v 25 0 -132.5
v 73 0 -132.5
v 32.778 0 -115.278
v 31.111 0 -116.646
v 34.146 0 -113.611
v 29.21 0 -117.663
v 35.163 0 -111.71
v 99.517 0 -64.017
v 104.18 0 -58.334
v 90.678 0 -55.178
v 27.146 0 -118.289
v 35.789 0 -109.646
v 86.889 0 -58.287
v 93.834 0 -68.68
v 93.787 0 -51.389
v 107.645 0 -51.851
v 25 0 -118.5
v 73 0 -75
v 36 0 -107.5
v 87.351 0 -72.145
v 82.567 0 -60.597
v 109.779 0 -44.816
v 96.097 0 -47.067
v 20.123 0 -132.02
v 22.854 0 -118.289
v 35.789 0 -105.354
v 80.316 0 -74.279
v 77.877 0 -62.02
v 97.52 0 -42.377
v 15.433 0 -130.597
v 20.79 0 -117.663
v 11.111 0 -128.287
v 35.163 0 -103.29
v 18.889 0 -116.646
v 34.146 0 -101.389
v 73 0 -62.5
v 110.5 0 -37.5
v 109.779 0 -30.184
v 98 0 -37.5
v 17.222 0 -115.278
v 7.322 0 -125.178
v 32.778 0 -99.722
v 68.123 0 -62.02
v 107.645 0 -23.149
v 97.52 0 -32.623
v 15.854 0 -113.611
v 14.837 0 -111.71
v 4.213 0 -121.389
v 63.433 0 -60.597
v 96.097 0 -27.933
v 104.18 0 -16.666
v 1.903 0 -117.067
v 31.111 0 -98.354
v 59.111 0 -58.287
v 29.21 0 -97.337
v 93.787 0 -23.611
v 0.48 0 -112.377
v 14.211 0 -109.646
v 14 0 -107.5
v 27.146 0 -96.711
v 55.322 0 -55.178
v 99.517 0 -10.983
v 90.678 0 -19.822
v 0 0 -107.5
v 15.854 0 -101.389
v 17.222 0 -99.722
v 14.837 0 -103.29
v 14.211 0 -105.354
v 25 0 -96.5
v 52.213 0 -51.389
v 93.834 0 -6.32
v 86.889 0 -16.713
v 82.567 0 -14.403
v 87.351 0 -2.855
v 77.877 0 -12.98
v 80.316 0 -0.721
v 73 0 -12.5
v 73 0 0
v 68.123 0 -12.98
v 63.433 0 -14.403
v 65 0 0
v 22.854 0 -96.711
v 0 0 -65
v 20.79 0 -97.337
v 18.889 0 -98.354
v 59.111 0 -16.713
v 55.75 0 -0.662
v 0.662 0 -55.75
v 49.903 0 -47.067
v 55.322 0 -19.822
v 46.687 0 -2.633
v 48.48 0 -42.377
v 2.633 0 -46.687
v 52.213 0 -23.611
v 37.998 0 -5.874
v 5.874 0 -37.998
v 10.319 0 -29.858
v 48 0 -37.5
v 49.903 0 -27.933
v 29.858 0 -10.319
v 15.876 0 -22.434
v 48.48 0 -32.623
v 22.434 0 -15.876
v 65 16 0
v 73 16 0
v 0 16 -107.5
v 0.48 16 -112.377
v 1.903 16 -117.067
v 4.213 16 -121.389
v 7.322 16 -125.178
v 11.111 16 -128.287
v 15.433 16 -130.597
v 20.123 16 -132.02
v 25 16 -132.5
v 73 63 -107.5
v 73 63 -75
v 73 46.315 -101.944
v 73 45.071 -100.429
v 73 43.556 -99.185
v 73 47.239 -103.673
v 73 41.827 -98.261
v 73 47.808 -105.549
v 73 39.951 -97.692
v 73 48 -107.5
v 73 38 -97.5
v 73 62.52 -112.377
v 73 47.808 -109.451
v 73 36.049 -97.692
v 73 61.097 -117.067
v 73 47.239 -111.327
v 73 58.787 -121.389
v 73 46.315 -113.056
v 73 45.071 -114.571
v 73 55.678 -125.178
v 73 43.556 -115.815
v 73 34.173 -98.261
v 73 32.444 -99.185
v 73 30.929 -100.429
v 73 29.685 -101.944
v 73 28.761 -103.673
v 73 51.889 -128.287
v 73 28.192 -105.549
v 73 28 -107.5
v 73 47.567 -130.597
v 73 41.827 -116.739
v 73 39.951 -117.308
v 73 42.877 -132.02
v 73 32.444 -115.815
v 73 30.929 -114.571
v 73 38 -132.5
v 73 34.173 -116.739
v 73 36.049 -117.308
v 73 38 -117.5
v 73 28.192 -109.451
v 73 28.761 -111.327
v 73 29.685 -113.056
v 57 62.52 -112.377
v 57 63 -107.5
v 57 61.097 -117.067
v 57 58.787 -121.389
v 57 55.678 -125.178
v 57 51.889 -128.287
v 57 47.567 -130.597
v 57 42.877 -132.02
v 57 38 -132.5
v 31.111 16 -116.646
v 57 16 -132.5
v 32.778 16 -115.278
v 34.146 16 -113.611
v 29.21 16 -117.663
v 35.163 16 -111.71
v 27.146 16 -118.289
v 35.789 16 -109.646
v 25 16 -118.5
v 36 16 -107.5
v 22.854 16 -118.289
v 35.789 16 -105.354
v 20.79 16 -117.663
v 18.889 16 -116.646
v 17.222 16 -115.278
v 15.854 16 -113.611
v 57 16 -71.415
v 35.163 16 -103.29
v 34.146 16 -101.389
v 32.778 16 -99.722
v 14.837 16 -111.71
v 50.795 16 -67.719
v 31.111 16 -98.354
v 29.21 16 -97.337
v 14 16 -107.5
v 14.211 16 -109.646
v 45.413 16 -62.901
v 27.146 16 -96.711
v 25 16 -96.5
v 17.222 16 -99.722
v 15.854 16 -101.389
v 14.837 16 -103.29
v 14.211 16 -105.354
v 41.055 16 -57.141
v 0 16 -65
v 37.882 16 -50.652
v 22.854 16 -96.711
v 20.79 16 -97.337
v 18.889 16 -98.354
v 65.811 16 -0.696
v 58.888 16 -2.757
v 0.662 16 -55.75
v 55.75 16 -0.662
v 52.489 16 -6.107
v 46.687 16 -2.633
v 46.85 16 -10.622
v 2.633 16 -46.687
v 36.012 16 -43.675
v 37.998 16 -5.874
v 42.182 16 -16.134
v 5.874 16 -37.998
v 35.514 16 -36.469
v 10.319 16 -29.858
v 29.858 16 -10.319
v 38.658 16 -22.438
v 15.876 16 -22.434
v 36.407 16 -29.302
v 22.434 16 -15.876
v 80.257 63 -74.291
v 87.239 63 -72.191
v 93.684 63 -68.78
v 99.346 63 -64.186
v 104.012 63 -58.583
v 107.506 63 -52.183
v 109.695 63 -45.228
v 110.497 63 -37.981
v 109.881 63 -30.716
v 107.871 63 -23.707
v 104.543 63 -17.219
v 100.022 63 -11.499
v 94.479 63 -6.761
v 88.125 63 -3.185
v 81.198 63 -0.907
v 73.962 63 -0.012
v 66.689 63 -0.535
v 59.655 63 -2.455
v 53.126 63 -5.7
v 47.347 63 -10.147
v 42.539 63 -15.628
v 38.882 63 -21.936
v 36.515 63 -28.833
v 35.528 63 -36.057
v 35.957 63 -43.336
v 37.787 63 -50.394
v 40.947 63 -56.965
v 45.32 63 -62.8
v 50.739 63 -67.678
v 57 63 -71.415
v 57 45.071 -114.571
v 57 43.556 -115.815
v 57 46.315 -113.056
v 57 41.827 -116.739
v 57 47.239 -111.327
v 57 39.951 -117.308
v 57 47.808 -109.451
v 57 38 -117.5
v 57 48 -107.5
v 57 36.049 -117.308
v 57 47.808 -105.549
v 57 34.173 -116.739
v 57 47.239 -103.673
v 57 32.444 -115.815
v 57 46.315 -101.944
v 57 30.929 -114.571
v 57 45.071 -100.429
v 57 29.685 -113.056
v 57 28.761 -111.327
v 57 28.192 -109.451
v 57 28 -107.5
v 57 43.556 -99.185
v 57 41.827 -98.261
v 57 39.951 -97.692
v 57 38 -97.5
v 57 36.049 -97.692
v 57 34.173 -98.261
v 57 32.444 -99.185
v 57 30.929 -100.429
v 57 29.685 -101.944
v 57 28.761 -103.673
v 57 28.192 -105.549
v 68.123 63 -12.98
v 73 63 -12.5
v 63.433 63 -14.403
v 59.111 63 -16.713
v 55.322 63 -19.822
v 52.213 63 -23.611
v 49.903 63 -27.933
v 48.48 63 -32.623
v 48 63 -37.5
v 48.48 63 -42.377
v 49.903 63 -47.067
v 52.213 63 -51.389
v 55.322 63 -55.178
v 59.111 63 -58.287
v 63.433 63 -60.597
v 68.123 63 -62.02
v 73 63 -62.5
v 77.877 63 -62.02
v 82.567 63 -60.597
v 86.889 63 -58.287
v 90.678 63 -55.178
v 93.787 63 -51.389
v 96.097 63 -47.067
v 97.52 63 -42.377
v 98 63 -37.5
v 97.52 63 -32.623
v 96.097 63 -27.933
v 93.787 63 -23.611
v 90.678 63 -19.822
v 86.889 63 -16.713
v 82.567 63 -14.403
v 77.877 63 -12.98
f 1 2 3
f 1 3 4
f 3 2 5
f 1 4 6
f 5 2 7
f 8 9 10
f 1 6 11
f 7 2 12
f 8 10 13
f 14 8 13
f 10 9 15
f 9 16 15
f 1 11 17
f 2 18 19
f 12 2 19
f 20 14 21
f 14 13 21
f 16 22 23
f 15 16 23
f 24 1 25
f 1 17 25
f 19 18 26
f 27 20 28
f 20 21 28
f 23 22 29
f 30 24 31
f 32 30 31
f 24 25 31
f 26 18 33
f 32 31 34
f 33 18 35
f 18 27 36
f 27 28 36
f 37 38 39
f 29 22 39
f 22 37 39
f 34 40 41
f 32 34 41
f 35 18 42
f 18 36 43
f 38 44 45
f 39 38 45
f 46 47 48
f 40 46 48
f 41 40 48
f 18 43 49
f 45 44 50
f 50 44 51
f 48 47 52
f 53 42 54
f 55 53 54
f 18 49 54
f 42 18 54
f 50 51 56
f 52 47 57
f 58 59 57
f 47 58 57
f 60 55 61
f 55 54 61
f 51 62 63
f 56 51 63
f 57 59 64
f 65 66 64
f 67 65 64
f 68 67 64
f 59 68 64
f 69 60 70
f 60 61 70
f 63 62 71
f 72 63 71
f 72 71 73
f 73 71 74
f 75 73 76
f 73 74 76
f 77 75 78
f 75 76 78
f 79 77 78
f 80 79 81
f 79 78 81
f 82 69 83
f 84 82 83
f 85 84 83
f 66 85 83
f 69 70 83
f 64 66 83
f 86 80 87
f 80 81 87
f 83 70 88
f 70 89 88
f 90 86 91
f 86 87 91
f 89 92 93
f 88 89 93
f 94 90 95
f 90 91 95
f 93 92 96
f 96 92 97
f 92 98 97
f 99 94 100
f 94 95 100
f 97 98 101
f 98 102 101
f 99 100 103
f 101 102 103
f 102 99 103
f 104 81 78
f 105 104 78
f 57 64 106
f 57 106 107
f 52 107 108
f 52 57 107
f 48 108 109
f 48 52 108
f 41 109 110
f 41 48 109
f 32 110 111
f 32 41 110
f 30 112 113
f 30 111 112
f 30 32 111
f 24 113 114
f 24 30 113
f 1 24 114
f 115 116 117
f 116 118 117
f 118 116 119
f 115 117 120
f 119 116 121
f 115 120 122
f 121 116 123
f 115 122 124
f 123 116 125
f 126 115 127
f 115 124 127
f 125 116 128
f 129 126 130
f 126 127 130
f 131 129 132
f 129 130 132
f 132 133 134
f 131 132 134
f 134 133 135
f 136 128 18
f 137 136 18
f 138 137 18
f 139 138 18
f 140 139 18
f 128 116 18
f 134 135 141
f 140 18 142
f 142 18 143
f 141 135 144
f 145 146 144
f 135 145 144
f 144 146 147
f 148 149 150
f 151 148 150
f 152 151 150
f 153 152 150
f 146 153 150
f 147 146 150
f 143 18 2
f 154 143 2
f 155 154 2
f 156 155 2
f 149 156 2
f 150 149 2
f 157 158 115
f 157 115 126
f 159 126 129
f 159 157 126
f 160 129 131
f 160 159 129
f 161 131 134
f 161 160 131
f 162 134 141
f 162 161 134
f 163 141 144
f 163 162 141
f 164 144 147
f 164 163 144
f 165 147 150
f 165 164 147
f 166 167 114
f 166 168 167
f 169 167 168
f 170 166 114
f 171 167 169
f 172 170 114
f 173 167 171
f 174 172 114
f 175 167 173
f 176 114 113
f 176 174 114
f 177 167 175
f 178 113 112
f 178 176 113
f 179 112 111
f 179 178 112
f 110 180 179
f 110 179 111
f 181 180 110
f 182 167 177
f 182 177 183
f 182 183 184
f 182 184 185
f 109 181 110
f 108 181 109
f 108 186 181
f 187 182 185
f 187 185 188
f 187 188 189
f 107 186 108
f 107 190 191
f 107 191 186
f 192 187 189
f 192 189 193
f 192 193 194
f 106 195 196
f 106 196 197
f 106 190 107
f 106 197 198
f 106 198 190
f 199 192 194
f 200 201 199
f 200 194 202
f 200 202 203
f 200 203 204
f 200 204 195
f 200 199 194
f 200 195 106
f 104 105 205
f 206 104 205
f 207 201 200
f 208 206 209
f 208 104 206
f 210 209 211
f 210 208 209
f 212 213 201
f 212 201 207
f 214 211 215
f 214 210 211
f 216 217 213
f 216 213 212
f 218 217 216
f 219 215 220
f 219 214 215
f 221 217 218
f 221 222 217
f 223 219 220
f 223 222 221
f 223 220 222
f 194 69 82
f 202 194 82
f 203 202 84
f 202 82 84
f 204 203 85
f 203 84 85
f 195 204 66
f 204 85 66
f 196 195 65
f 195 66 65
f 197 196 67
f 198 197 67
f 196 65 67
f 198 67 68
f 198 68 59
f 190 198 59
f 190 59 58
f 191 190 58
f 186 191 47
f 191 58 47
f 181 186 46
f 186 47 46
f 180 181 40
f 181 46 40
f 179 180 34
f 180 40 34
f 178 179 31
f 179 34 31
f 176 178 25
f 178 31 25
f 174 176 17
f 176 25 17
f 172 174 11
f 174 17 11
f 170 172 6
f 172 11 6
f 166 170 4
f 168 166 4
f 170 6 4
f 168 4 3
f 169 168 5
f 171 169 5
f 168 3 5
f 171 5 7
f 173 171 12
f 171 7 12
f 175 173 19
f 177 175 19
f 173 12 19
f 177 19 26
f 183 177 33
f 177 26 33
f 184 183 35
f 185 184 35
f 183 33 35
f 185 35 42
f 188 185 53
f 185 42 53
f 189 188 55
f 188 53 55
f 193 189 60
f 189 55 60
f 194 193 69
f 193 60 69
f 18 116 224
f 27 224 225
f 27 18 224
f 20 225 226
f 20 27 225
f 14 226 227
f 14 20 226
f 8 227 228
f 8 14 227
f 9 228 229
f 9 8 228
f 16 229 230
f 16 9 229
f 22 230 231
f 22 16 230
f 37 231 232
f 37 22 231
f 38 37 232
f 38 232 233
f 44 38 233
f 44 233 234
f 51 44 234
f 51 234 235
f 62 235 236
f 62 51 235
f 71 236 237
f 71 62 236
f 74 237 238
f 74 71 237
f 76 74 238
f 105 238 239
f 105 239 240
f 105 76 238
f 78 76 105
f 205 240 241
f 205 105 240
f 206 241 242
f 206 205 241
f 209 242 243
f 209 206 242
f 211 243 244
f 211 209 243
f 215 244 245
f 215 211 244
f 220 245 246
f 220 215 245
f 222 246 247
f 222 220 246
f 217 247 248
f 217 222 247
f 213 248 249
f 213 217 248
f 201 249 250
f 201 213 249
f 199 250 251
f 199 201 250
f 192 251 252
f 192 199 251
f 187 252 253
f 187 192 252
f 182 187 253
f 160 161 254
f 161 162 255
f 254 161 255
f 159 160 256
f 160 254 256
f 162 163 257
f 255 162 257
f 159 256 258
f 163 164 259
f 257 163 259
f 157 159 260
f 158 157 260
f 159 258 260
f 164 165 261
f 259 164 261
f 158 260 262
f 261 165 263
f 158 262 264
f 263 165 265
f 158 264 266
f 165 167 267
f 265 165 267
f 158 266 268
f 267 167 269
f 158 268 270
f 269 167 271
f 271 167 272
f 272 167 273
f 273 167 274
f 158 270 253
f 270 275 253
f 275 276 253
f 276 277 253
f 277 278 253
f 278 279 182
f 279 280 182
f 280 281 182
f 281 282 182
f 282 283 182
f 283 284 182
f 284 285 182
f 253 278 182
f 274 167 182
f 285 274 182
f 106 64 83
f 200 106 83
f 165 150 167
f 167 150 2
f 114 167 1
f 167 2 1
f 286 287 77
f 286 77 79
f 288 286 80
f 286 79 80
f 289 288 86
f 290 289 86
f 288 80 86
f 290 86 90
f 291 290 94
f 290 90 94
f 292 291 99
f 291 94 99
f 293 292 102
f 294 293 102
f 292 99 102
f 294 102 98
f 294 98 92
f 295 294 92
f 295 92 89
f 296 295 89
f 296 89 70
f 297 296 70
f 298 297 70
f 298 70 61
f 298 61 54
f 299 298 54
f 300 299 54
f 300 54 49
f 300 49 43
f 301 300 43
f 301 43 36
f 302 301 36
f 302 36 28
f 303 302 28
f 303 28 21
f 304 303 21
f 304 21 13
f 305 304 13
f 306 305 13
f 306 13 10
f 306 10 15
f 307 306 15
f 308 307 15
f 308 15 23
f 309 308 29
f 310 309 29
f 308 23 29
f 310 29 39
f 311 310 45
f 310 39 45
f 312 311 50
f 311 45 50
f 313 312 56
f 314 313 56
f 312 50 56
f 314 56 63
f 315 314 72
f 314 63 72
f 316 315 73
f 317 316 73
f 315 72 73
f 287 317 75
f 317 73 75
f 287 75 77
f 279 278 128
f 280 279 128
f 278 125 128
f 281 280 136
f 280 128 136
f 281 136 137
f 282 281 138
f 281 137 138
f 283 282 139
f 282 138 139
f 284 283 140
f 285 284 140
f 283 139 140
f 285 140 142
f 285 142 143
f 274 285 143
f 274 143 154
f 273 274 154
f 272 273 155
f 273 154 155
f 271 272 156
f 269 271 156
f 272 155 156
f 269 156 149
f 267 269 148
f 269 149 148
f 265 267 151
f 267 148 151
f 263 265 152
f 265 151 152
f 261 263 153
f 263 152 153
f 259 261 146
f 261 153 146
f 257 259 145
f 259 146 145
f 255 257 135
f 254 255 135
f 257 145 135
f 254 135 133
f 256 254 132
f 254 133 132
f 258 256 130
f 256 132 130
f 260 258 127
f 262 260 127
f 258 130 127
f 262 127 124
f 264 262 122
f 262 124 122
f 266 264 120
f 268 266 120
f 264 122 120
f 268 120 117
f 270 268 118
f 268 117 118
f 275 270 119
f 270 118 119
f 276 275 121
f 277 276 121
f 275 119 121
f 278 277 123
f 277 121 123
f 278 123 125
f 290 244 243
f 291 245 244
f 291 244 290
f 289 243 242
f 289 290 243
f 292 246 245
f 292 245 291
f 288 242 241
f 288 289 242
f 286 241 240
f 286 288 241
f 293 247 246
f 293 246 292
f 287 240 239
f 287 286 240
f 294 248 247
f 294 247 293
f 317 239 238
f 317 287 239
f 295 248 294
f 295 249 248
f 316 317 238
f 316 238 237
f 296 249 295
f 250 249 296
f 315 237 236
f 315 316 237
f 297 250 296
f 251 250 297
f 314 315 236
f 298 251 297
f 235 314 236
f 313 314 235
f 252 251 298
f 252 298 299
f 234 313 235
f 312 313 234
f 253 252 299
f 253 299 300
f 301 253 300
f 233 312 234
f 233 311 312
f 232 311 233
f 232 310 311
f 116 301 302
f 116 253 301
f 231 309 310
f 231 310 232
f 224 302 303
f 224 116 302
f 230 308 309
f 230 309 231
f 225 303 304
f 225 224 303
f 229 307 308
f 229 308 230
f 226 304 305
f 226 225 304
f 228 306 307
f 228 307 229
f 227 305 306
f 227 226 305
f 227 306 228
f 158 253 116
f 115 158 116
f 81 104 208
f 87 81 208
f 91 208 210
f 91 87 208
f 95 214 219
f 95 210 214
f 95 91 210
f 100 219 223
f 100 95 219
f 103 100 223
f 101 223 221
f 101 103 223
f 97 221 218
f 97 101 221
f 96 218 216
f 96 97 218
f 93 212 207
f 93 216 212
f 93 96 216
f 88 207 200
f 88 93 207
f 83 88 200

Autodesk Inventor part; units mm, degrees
ref_plane "YZ Plane" through (0, 0, 0) normal (1, 0, 0) x (0, 1, 0)
ref_plane "XZ Plane" through (0, 0, 0) normal (0, 1, 0) x (-1, 0, 0)
ref_plane "XY Plane" through (0, 0, 0) normal (0, 0, 1) x (1, 0, 0)
sketch "Szkic1" plane through (0, 0, 0) normal (0, 1, 0) x (-1, 0, 0)
  line L0 (-65, 0) -> (-73, 0)
  line L1 (-73, 0) -> (-73, -132.5)
  line L2 (-73, -132.5) -> (-25, -132.5)
  line L3 (0, -107.5) -> (0, -65)
  arc A0 (-25, -132.5) -> (0, -107.5) centre (-25, -107.5) ccw
  arc A1 (0, -65) -> (-65, 0) centre (-65, -65) ccw
  circle A2 centre (-73, -37.5) radius 37.5
  point P0 (0, 0)
  point P1 (0, -132.5)
  point P2 (-73, -75)
  dimension "d4" = 75
  dimension "d0" = 73
  dimension "d1" = 132.5
  dimension "d2" = 25
  dimension "d3" = 65
extrude "Wyciągnięcie proste1" add sketch "Szkic1" along normal blind 16 contours A1 L3 A0 L2 L1 A2 L0
sketch "Szkic2" plane through (0, 0, 0) normal (0, -1, 0) x (1, 0, 0)
  arc A0 (73, 0) -> (73, -75) centre (73, -37.5) ccw projected
  circle A1 centre (73, -37.5) radius 37.5
  point P0 (0, 0)
  point P1 (73, -75)
extrude "Wyciągnięcie proste2" add sketch "Szkic2" against normal blind 63
sketch "Szkic3" plane through (0, 16, 0) normal (0, 1, 0) x (1, 0, 0)
  arc A0 (25, 132.5) -> (0, 107.5) centre (25, 107.5) ccw projected
  line L0 (73, 132.5) -> (25, 132.5) projected
  line L1 (73, 75) -> (73, 132.5) projected
  line L2 (73, 132.5) -> (73, 75)
  line L3 (73, 132.5) -> (57, 132.5)
  line L4 (57, 132.5) -> (57, 71.4153)
  arc A1 (73, 75) -> (73, 0) centre (73, 37.5) ccw projected
  arc A2 (73, 75) -> (57, 71.4153) centre (73, 37.5) ccw
  point P0 (0, 0)
  dimension "d9" = 16
extrude "Wyciągnięcie proste3" add sketch "Szkic3" along normal blind 47
fillet "Zaokrąglenie1" radius 25 1 edges at (65, 63, -132.5)
sketch "Szkic4" plane through (0, 63, 0) normal (0, 1, 0) x (1, 0, 0)
  arc A0 (57, 71.4153) -> (73, 0) centre (73, 37.5) ccw projected
  point P0 (0, 0)
hole "Otwór1" at (73, 63, -37.5) direction (0, -1, 0) diameter 50 end through all
sketch "Szkic5" plane through (57, 16, -132.5) normal (-1, 0, 0) x (0, 0, 1)
  arc A0 (25, 47) -> (0, 22) centre (25, 22) ccw projected
  point P0 (132.5, -16)
hole "Otwór2" at (57, 38, -107.5) direction (1, 0, 0) diameter 20 end through all
sketch "Szkic6" plane through (0, 16, 0) normal (0, 1, 0) x (1, 0, 0)
  arc A0 (25, 132.5) -> (0, 107.5) centre (25, 107.5) ccw projected
  point P0 (0, 0)
hole "Otwór3" at (25, 16, -107.5) direction (0, -1, 0) diameter 22 end through all
